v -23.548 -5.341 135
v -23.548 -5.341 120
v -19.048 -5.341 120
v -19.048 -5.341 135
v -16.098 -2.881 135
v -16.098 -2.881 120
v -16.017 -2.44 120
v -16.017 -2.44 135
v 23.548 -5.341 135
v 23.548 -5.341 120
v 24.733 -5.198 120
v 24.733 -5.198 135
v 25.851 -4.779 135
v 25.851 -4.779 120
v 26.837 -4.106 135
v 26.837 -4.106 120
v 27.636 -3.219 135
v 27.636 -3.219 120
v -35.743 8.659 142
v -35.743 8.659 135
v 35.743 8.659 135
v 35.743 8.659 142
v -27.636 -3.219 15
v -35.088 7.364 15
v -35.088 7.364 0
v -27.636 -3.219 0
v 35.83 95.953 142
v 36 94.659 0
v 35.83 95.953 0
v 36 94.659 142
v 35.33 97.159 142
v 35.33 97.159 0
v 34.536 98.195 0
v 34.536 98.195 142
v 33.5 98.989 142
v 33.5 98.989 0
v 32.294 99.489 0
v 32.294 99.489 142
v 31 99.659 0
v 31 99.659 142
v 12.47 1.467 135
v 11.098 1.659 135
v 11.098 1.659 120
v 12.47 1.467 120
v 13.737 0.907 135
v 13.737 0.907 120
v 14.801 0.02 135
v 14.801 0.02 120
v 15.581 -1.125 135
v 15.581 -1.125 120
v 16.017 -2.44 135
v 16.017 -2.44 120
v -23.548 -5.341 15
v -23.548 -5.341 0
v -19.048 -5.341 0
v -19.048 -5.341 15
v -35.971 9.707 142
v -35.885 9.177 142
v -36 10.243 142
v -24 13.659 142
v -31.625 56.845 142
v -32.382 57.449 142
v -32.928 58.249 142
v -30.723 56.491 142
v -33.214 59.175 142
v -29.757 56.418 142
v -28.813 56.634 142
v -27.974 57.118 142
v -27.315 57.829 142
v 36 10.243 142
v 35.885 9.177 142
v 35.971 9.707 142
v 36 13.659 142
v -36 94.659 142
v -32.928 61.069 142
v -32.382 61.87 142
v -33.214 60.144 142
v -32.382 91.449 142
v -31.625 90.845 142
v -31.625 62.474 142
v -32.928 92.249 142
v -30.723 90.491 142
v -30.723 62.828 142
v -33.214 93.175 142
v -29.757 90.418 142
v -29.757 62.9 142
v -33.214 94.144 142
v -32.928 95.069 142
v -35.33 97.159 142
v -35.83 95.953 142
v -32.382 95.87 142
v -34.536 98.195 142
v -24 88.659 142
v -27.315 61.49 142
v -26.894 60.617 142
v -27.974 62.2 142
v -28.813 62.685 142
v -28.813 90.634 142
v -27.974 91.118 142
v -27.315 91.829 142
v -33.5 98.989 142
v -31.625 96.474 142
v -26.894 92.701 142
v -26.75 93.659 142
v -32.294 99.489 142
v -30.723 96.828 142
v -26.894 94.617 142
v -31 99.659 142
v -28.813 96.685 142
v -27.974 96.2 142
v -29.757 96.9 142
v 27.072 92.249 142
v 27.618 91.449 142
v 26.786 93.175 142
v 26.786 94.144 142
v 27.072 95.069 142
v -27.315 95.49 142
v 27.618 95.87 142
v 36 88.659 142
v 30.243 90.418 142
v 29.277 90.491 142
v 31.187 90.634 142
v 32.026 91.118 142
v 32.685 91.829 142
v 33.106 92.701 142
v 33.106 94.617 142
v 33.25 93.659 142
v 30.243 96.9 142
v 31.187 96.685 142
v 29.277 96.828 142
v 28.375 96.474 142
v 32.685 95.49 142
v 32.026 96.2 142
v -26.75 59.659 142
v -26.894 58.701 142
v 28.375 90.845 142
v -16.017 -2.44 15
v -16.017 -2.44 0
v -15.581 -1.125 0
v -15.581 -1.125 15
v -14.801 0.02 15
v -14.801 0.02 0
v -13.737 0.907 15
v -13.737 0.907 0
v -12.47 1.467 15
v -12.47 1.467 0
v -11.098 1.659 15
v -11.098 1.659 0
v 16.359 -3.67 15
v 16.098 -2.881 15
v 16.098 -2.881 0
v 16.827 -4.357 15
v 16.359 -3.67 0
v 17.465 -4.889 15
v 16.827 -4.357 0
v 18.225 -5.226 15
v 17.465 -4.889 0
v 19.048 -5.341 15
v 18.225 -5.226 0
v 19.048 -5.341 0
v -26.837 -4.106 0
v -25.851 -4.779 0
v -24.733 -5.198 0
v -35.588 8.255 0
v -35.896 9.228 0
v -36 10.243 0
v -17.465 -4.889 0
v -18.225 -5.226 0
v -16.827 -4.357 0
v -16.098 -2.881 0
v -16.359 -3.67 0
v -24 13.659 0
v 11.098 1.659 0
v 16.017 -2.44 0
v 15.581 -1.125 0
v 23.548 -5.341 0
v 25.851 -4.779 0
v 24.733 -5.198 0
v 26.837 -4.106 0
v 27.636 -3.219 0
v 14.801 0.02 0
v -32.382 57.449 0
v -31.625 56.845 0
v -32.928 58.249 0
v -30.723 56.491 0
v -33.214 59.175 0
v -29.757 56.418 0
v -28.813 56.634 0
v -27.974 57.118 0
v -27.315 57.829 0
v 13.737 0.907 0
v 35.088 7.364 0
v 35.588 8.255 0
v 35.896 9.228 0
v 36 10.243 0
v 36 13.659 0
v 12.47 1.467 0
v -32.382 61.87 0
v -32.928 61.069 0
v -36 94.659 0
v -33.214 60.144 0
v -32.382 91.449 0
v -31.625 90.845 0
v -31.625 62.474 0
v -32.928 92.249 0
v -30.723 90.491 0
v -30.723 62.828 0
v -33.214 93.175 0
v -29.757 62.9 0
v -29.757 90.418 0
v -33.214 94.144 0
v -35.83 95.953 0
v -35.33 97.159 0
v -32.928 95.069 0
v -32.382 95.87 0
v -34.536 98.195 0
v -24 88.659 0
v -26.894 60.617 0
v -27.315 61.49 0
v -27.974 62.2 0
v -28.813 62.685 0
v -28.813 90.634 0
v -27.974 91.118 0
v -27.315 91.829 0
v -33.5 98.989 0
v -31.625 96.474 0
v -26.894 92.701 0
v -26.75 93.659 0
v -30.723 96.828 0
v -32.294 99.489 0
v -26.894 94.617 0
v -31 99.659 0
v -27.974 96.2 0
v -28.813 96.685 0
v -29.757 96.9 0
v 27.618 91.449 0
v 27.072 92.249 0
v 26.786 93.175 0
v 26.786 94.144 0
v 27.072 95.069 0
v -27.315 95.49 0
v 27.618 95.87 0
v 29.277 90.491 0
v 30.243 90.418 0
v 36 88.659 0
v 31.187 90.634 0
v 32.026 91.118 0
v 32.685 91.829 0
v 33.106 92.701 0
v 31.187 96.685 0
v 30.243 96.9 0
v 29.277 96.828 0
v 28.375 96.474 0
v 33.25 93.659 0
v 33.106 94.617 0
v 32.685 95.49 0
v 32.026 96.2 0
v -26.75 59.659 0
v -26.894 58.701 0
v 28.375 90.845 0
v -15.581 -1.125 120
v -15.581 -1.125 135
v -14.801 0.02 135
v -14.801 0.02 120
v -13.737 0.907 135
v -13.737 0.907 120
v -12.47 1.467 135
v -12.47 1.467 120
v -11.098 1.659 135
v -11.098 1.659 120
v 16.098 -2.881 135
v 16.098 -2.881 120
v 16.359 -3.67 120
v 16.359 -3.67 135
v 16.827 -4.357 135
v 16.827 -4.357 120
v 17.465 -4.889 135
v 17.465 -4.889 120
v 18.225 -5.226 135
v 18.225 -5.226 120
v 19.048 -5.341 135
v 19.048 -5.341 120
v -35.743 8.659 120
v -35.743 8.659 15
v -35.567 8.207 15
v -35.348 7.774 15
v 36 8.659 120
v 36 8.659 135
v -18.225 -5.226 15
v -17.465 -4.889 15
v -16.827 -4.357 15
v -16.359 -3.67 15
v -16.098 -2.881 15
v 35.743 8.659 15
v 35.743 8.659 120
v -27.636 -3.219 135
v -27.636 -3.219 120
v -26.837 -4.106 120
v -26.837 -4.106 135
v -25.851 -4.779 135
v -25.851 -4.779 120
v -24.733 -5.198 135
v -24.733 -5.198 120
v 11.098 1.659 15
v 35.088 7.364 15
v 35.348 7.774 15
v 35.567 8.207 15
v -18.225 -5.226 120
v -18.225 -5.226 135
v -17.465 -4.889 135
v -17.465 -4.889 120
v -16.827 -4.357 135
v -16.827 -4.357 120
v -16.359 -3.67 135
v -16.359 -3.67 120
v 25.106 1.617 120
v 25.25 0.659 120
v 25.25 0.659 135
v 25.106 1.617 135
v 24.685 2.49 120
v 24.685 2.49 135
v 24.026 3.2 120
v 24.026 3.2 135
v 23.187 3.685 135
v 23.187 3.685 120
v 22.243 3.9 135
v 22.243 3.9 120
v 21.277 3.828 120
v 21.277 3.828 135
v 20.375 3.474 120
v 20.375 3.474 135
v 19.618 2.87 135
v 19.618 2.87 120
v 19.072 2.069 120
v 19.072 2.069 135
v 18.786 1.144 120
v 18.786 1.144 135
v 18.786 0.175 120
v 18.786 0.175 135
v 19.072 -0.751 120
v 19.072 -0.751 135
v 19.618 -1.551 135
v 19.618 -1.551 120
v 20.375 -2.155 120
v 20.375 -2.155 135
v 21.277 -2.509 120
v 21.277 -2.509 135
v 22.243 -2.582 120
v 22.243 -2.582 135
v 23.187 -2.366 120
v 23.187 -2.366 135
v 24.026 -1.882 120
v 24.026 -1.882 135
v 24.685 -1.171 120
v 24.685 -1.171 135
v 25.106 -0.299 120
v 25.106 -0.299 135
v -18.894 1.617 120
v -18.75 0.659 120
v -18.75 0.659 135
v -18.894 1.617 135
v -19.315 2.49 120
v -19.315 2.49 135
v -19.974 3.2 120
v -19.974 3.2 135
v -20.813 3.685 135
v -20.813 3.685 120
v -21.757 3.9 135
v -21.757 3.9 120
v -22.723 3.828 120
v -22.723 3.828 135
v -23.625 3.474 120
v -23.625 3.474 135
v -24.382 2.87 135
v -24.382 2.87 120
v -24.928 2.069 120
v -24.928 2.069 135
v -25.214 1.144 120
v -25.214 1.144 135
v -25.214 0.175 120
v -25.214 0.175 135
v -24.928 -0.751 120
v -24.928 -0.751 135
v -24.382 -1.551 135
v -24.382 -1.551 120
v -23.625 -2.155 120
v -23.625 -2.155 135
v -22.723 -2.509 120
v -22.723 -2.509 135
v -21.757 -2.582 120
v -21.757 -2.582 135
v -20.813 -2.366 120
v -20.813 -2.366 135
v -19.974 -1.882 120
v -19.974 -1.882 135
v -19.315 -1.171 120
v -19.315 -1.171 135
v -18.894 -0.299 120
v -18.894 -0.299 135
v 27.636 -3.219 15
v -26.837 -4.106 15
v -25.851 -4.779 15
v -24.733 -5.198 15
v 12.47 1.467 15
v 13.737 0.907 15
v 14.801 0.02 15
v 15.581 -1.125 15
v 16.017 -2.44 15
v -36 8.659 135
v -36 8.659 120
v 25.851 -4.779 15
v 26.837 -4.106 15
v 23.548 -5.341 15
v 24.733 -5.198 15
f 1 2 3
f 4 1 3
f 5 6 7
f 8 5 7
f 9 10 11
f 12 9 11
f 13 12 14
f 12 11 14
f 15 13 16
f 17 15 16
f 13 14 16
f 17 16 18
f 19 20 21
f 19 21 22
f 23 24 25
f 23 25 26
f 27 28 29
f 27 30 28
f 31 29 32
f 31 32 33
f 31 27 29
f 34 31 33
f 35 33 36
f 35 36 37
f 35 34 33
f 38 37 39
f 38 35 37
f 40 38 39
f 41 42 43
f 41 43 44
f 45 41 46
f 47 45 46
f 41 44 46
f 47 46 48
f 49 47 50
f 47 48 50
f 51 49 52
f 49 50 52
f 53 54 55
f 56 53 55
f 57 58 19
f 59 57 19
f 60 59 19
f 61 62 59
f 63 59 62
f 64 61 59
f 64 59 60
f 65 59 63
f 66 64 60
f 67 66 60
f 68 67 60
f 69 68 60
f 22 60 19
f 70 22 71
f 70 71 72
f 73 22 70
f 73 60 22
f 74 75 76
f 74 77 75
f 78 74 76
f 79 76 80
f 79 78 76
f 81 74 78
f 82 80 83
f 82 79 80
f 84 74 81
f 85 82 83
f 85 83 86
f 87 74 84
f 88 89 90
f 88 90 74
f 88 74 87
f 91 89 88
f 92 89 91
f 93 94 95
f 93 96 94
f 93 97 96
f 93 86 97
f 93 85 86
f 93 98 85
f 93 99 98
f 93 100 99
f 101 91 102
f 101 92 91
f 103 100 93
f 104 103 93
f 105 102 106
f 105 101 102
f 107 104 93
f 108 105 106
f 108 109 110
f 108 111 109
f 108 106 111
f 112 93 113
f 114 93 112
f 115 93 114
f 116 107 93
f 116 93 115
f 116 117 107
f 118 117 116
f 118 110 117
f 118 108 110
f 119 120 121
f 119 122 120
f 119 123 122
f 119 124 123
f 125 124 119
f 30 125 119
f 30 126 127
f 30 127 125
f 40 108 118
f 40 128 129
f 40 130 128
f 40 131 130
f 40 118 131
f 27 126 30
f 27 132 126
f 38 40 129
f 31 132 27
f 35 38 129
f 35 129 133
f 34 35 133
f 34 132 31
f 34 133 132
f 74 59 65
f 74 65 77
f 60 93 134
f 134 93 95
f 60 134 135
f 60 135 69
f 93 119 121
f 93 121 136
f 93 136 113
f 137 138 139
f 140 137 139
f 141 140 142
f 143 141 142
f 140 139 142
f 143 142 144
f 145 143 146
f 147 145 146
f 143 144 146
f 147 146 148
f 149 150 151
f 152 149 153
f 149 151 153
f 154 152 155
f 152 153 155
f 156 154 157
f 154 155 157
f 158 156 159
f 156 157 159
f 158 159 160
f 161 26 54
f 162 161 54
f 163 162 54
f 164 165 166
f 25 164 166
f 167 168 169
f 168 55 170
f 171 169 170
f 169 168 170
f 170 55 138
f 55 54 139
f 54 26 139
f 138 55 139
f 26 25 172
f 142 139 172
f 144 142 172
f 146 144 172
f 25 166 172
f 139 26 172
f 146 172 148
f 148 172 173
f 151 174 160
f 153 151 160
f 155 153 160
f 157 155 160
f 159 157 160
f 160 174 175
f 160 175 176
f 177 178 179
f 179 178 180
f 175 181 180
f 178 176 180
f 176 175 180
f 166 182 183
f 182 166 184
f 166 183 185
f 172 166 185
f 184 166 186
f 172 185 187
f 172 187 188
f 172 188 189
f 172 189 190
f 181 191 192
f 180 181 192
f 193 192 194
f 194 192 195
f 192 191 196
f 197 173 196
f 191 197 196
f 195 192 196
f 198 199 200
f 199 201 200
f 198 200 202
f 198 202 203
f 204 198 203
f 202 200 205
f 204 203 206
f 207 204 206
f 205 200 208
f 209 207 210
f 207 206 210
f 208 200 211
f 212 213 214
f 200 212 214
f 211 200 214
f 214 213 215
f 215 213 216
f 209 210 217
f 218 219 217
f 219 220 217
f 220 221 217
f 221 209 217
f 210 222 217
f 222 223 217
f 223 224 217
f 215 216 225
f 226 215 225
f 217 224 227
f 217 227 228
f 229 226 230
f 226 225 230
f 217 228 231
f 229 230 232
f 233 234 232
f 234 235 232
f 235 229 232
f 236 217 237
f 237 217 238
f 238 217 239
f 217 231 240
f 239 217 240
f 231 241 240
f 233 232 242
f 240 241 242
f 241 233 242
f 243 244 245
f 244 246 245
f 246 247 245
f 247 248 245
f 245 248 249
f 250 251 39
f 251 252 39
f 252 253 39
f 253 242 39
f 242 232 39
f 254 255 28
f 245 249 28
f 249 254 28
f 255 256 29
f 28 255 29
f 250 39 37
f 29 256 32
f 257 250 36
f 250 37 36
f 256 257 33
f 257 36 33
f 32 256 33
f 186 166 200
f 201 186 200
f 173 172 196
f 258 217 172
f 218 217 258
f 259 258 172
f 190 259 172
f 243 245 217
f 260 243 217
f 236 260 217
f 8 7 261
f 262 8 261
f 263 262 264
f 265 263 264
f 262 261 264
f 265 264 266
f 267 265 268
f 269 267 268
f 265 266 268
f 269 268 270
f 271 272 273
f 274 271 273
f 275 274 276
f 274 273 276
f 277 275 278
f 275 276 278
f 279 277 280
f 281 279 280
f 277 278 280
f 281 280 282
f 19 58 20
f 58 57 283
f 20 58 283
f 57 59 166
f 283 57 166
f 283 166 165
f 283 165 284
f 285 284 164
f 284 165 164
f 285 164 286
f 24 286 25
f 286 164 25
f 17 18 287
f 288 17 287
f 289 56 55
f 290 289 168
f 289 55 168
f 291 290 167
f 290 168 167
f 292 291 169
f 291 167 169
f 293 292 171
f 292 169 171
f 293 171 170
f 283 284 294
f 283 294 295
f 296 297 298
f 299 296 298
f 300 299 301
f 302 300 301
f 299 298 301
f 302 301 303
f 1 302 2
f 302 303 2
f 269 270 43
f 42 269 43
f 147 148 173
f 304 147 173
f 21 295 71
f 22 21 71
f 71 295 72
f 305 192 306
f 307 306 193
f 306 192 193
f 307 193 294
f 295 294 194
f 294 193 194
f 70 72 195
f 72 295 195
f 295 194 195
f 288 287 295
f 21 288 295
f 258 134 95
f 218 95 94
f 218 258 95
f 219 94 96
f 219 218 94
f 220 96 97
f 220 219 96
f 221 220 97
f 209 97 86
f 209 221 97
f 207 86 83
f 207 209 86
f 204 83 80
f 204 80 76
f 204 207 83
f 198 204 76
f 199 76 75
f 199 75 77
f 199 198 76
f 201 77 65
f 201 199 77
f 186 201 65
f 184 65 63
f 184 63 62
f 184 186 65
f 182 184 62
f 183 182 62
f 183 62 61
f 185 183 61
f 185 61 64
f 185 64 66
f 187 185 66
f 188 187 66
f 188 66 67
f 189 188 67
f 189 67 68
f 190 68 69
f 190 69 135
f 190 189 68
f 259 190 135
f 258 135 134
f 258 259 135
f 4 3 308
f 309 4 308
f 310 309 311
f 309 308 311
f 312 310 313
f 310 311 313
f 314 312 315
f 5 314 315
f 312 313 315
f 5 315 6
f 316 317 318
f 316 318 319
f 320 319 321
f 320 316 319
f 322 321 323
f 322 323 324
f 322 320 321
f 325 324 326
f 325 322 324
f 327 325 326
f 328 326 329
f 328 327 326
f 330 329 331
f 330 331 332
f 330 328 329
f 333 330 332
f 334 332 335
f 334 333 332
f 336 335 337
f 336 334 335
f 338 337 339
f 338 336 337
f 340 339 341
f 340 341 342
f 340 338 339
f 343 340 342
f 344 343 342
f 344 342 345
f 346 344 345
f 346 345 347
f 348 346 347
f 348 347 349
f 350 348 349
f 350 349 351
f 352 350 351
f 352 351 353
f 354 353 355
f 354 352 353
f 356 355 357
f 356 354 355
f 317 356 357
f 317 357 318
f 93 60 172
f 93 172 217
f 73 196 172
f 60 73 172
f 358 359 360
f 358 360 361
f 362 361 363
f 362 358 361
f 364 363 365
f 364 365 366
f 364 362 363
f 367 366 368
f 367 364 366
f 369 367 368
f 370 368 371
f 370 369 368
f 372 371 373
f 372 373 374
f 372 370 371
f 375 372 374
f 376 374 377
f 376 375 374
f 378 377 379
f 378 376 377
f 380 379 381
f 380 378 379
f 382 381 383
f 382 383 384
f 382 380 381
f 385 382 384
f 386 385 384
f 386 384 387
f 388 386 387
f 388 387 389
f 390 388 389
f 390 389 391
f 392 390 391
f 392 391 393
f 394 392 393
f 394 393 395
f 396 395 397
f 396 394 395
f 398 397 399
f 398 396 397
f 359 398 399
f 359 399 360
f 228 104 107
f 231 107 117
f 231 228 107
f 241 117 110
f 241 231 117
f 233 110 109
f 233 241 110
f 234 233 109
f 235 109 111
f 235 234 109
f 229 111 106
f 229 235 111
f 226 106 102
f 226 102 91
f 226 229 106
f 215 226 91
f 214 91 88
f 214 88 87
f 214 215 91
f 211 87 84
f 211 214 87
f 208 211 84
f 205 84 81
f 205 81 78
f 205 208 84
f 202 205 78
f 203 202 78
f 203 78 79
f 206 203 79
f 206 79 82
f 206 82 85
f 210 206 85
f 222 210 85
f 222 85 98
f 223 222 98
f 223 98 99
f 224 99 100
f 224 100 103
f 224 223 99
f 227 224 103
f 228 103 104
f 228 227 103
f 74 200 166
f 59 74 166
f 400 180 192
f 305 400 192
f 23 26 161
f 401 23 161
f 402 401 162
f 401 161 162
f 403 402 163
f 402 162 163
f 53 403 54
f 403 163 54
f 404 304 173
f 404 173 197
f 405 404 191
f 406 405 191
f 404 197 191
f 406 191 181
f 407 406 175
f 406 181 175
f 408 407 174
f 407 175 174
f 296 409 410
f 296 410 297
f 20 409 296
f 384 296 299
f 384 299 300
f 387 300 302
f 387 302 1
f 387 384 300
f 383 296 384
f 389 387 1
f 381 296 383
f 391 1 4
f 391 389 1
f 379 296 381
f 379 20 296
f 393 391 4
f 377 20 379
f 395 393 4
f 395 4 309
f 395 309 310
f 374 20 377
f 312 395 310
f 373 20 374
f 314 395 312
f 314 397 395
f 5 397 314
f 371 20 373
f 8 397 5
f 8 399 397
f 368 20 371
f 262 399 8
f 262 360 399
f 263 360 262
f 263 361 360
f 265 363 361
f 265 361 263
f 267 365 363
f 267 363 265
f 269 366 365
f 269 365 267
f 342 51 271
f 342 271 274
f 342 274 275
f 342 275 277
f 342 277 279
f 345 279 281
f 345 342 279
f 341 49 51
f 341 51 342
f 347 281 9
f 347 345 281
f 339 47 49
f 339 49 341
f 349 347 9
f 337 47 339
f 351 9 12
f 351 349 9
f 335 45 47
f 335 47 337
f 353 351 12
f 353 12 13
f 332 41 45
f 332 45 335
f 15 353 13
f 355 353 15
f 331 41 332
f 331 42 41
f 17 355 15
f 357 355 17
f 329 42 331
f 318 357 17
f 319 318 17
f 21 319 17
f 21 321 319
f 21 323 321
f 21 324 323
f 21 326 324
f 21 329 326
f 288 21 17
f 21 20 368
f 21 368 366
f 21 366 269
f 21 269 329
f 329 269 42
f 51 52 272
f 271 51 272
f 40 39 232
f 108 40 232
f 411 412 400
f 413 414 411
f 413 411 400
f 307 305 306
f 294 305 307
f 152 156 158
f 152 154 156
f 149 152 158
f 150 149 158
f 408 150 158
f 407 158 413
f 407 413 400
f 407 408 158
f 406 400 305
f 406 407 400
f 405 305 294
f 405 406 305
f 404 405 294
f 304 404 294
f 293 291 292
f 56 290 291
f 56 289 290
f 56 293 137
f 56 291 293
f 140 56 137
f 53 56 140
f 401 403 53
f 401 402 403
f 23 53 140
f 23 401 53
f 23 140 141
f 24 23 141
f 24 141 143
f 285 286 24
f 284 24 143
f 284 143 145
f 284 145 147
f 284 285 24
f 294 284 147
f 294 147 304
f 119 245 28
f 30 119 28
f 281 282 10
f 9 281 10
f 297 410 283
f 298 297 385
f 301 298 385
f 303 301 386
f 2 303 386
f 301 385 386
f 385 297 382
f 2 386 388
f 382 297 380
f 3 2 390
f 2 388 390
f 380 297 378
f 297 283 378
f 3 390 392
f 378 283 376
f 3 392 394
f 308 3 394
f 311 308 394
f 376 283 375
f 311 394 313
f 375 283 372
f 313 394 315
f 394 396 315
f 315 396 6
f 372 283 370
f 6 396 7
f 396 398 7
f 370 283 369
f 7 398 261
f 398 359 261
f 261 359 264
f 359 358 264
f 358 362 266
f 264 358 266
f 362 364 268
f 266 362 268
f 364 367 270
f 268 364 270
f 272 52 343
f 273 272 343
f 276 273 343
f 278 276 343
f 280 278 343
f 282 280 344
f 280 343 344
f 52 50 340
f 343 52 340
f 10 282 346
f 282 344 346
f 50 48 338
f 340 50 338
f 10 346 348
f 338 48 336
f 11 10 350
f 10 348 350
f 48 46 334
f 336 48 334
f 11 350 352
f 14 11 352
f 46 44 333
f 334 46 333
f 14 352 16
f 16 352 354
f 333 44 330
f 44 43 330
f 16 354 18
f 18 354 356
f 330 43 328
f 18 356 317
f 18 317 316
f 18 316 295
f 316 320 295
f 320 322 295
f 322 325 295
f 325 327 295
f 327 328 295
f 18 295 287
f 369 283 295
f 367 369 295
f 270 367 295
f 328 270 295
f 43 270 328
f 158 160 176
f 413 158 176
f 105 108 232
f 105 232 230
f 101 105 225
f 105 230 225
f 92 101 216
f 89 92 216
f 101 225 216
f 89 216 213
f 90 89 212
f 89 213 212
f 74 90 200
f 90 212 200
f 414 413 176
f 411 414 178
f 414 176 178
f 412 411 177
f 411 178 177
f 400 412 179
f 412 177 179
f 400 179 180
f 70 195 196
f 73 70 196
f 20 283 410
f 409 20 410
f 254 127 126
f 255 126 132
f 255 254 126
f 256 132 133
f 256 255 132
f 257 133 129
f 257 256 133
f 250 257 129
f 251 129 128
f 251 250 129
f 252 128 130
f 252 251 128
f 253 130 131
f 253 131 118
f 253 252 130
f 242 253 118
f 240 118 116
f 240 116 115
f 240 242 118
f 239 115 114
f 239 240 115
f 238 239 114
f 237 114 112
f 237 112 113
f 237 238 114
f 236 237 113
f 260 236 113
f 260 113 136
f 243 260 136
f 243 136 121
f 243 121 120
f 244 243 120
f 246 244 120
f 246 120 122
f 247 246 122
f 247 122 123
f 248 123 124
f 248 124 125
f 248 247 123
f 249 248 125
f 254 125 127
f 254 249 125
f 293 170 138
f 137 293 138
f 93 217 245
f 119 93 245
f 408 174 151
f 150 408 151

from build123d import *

# Parameters (mm, degrees)
SKETCH1_R           = 3.25
BOSS_EXTRUDE1_DEPTH = 142
SKETCH2_W           = 127
SKETCH2_H           = 26.313308587
CUT_EXTRUDE1_DEPTH  = 73
FILLET1_R           = 5
SKETCH3_R           = 3.25
BOSS_EXTRUDE2_DEPTH = 15


with BuildPart() as part:
    # Sketch1 → Boss-Extrude1 (new body)
    with BuildSketch(Plane.XY):
        with BuildLine():
            Line((36, 88.659292886), (36, 99.659292886))
            Line((36, 99.659292886), (-31, 99.659292886))
            ThreePointArc((-31, 99.659292886), (-34.535533906, 98.194826792), (-36, 94.659292886))
            Line((-36, 94.659292886), (-36, 10.242951409))
            ThreePointArc((-36, 10.242951409), (-35.766621895, 8.733211131), (-35.088273717, 7.364406982))
            Line((-35.088273717, 7.364406982), (-27.636343301, -3.219251541))
            ThreePointArc((-27.636343301, -3.219251541), (-25.851032661, -4.778765368), (-23.548069585, -5.340707114))
            Line((-23.548069585, -5.340707114), (-19.04842059, -5.340707114))
            ThreePointArc((-19.04842059, -5.340707114), (-17.127708267, -4.64523834), (-16.09752624, -2.881283229))
            Line((-16.09752624, -2.881283229), (-16.016640938, -2.439746922))
            ThreePointArc((-16.016640938, -2.439746922), (-14.299670893, 0.500178263), (-11.098483688, 1.659292886))
            Line((-11.098483688, 1.659292886), (11.098483688, 1.659292886))
            ThreePointArc((11.098483688, 1.659292886), (14.299670893, 0.500178263), (16.016640938, -2.439746922))
            Line((16.016640938, -2.439746922), (16.09752624, -2.881283229))
            ThreePointArc((16.09752624, -2.881283229), (17.127708267, -4.64523834), (19.04842059, -5.340707114))
            Line((19.04842059, -5.340707114), (23.548069585, -5.340707114))
            ThreePointArc((23.548069585, -5.340707114), (25.851032661, -4.778765368), (27.636343301, -3.219251541))
            Line((27.636343301, -3.219251541), (35.088273717, 7.364406982))
            ThreePointArc((35.088273717, 7.364406982), (35.766621895, 8.733211131), (36, 10.242951409))
            Line((36, 10.242951409), (36, 13.659292886))
            Line((36, 13.659292886), (-24, 13.659292886))
            Line((-24, 13.659292886), (-24, 88.659292886))
            Line((-24, 88.659292886), (36, 88.659292886))
        make_face()
        with Locations((30, 93.659292886)):
            Circle(SKETCH1_R, mode=Mode.SUBTRACT)
        with Locations((-30, 93.659292886)):
            Circle(SKETCH1_R, mode=Mode.SUBTRACT)
        with Locations((-30, 59.659292886)):
            Circle(SKETCH1_R, mode=Mode.SUBTRACT)
    extrude(amount=BOSS_EXTRUDE1_DEPTH)

    # Sketch2 → Cut-Extrude1 (cut, through all)
    with BuildSketch(Plane.ZY.offset(36)):
        with Locations((78.5, -4.497361408)):
            Rectangle(SKETCH2_W, SKETCH2_H)
    extrude(amount=-CUT_EXTRUDE1_DEPTH, mode=Mode.SUBTRACT)

    # Fillet1
    fillet1_edges = [part.edges().sort_by_distance(p)[0] for p in [
        (36, 99.659292886, 71),
    ]]
    fillet(fillet1_edges, radius=FILLET1_R)

    # Sketch3 → Boss-Extrude2 (add)
    with BuildSketch(Plane.XY.offset(120)):
        with BuildLine():
            Line((-36, 8.659292886), (-27.636343301, -3.219251541))
            ThreePointArc((-27.636343301, -3.219251541), (-25.851032661, -4.778765368), (-23.548069585, -5.340707114))
            Line((-23.548069585, -5.340707114), (-19.04842059, -5.340707114))
            ThreePointArc((-19.04842059, -5.340707114), (-17.127708267, -4.64523834), (-16.09752624, -2.881283229))
            Line((-16.09752624, -2.881283229), (-16.016640938, -2.439746922))
            ThreePointArc((-16.016640938, -2.439746922), (-14.299670893, 0.500178263), (-11.098483688, 1.659292886))
            Line((-11.098483688, 1.659292886), (11.098483688, 1.659292886))
            ThreePointArc((11.098483688, 1.659292886), (14.299670893, 0.500178263), (16.016640938, -2.439746922))
            Line((16.016640938, -2.439746922), (16.09752624, -2.881283229))
            ThreePointArc((16.09752624, -2.881283229), (17.127708267, -4.64523834), (19.04842059, -5.340707114))
            Line((19.04842059, -5.340707114), (23.548069585, -5.340707114))
            ThreePointArc((23.548069585, -5.340707114), (25.851032661, -4.778765368), (27.636343301, -3.219251541))
            Line((27.636343301, -3.219251541), (36, 8.659292886))
            Line((36, 8.659292886), (-36, 8.659292886))
        make_face()
        with Locations((-22, 0.659292886)):
            Circle(SKETCH3_R, mode=Mode.SUBTRACT)
        with Locations((22, 0.659292886)):
            Circle(SKETCH3_R, mode=Mode.SUBTRACT)
    extrude(amount=BOSS_EXTRUDE2_DEPTH)


solid = part.part
